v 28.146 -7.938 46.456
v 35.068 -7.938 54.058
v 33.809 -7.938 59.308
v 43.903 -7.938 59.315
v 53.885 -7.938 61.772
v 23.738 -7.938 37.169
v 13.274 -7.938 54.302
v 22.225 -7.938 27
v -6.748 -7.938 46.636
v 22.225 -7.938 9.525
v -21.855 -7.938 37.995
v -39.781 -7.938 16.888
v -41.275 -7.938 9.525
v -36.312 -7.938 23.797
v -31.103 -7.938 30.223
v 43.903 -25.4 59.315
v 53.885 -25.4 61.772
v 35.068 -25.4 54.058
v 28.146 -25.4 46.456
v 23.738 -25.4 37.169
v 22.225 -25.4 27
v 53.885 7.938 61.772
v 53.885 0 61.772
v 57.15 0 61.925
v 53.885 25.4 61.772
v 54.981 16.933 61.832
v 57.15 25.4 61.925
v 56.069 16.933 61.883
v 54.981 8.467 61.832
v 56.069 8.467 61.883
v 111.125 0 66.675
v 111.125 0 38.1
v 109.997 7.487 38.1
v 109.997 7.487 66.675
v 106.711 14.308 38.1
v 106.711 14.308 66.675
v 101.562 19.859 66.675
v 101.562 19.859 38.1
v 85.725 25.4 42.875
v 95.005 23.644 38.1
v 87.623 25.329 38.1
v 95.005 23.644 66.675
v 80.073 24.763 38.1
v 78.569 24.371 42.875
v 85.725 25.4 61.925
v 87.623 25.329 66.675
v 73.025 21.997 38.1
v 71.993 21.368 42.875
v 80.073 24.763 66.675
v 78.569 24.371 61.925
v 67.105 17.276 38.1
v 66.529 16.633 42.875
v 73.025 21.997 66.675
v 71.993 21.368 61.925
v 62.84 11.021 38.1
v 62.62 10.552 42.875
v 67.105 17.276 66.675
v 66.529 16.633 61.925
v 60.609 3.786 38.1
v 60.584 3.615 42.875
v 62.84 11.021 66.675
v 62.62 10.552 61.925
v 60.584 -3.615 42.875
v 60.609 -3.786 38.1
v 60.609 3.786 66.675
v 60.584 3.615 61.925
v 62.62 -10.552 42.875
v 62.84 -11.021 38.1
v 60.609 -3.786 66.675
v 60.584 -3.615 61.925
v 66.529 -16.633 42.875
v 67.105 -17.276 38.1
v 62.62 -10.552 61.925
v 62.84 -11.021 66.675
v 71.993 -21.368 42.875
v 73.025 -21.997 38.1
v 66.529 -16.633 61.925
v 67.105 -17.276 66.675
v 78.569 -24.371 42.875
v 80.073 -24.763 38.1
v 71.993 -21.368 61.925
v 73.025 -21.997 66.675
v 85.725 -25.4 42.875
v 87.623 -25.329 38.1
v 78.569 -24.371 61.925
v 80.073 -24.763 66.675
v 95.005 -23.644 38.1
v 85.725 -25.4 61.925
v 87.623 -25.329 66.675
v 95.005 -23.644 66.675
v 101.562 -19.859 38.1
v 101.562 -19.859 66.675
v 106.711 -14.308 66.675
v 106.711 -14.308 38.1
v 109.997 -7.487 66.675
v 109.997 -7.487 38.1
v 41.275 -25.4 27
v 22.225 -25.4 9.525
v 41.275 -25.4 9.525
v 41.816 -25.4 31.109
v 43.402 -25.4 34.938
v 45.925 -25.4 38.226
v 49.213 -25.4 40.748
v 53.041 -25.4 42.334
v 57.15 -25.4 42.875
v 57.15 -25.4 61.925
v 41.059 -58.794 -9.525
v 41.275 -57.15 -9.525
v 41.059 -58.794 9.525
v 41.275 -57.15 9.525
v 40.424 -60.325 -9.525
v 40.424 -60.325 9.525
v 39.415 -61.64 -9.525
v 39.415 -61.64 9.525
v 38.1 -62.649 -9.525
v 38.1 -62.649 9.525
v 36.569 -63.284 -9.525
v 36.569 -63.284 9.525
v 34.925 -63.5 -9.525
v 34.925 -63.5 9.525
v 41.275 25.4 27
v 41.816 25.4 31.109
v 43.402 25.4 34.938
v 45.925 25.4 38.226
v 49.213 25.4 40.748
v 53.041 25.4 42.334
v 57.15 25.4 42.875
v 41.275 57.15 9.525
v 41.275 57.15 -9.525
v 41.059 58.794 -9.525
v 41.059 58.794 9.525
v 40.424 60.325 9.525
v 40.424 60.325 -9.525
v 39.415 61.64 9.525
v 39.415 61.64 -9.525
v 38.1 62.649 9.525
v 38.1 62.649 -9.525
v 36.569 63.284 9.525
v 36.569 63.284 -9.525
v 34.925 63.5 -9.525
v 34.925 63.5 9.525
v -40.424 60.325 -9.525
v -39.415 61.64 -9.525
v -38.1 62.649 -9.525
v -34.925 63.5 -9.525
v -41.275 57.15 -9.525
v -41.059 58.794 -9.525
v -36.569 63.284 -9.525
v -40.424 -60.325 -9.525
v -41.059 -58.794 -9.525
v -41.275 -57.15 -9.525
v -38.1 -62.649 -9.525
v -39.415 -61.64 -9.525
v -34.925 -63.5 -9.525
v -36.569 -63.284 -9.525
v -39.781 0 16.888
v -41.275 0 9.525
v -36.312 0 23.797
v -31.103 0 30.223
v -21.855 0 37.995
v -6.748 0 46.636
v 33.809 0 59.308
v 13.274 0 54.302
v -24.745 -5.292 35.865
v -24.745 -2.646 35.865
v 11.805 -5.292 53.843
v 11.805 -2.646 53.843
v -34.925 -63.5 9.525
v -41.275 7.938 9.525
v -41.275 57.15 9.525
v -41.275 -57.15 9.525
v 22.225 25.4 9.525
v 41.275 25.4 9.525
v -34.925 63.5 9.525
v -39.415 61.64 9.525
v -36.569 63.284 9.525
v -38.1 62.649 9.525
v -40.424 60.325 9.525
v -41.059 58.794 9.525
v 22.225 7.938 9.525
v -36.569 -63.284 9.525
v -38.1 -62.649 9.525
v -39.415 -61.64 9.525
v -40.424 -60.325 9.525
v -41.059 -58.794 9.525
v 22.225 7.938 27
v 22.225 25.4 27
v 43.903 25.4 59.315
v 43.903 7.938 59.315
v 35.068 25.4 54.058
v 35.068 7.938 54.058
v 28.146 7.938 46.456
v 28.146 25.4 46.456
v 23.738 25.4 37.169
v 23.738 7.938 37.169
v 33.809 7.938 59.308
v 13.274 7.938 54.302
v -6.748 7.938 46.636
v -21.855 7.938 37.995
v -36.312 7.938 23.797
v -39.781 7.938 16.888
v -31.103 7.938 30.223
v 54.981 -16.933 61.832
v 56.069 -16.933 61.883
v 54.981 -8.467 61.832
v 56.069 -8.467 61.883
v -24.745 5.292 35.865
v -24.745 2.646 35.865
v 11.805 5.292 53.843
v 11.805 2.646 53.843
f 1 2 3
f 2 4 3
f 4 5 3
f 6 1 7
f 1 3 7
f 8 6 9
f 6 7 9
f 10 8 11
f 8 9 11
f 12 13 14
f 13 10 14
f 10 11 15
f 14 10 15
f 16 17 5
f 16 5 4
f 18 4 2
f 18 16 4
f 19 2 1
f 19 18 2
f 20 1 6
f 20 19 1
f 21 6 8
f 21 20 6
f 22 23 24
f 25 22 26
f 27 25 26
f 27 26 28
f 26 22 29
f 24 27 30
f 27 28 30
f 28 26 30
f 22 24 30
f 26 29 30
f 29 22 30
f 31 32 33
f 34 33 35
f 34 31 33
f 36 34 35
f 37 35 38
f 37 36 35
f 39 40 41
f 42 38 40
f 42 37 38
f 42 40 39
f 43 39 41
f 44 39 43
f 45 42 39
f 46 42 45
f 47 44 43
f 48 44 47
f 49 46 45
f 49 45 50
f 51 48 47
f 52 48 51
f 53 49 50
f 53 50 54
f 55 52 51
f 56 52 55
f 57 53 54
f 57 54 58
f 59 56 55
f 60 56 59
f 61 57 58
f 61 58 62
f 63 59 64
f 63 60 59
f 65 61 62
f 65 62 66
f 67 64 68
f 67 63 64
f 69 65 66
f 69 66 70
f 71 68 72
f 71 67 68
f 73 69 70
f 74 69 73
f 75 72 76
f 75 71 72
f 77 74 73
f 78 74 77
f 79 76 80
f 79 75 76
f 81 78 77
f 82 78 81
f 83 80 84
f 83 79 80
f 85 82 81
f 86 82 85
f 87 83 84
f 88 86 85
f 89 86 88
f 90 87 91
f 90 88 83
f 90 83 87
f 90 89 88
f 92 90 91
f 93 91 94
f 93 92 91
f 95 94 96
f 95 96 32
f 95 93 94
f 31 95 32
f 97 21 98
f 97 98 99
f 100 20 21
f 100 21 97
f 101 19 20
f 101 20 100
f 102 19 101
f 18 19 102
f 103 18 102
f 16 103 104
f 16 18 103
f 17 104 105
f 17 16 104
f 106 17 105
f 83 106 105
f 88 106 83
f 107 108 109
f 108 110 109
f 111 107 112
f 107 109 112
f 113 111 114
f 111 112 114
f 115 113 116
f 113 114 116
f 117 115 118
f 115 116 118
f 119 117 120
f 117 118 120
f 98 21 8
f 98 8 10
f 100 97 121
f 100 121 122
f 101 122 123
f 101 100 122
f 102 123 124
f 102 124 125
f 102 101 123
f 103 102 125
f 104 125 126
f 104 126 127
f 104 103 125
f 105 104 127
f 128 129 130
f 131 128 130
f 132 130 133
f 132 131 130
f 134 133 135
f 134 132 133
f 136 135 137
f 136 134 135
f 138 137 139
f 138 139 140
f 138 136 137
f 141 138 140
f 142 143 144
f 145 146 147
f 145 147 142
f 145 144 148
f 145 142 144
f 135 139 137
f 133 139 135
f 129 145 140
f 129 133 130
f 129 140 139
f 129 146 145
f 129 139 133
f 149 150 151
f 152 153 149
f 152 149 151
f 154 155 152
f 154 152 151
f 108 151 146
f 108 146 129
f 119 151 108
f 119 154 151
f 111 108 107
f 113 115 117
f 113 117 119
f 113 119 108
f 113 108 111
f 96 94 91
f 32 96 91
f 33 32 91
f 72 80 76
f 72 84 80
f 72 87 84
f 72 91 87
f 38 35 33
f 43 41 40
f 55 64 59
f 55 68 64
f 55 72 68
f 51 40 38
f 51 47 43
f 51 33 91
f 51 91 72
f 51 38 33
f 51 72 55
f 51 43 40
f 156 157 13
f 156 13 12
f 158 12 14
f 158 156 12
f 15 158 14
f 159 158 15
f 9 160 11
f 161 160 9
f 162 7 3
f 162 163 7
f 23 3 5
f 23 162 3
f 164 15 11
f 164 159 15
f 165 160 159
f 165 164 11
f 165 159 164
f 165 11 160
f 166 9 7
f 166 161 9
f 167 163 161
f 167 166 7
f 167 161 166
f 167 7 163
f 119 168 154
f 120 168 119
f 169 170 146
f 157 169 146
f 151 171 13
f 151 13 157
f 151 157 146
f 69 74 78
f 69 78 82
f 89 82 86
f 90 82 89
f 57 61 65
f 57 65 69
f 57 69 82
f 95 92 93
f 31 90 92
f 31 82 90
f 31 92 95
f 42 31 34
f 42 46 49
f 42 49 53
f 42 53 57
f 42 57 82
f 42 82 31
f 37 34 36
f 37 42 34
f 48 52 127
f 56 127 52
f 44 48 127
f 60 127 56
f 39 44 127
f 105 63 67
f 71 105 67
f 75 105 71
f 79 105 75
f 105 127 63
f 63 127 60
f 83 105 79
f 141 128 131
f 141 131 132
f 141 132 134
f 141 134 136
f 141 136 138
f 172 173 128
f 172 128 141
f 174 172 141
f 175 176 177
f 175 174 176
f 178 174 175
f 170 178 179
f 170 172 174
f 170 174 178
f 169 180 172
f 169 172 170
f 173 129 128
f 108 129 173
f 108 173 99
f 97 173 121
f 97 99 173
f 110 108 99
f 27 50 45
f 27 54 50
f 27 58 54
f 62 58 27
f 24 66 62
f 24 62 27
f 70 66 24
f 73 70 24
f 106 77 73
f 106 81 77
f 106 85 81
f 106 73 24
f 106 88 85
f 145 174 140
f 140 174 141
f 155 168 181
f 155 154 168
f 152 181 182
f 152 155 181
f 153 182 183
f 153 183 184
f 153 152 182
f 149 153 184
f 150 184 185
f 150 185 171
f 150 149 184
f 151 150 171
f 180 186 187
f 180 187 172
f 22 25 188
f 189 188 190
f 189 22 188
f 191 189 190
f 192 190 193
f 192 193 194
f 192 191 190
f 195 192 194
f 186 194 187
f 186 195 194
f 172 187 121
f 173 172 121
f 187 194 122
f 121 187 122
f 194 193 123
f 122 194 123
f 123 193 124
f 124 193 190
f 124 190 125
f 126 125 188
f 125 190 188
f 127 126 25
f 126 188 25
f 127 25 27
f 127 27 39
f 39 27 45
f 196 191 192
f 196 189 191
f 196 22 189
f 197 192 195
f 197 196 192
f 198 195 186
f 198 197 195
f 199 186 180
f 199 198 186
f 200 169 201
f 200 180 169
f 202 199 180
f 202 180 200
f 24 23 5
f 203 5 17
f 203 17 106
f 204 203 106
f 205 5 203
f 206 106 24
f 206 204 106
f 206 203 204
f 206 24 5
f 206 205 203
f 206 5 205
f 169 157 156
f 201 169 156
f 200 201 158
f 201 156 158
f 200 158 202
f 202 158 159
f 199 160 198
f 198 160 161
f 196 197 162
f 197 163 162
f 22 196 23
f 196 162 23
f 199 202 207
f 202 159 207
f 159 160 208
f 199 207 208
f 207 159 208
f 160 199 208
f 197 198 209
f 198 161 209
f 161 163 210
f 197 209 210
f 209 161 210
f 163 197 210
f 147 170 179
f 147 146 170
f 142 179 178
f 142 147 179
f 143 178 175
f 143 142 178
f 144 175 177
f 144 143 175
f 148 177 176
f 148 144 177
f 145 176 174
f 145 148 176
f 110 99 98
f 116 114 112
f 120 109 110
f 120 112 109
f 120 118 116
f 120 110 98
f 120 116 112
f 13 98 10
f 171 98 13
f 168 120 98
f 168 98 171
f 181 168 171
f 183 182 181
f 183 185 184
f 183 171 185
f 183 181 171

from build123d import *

# Parameters (mm, degrees)
F1_DEPTH = 63.5
F0_W     = 25.4
F0_H     = 19.05
F2_DEPTH = 25.4
F3_DEPTH = 7.9375
F5_R     = 6.35


# Not quite as in the source:
# - a feature of the source that left no trace in its solid (it failed there, or was rolled back) is left out


with BuildPart() as f1:
    # F0 (on Front) → F1 (new body, symmetric)
    with BuildSketch(Plane.XZ):
        Polygon((22.225, 9.525), (-41.275, 9.525), (-41.275, -9.525), (41.275, -9.525), (41.275, 9.525), align=None)
    extrude(amount=F1_DEPTH, both=True)

    # F0 (on Front) → F2 (join, symmetric)
    with BuildSketch(Plane.XZ):
        with BuildLine():
            Line((22.225, 27.0002), (22.225, 9.525))
            Line((22.225, 9.525), (41.275, 9.525))
            Line((41.275, 9.525), (41.275, 27.0002))
            ThreePointArc((41.275, 27.0002), (45.9246798487, 38.2255201513), (57.15, 42.8752))
            Line((57.15, 42.8752), (60.325, 42.8752))
            Line((60.325, 42.8752), (60.325, 61.9252))
            Line((60.325, 61.9252), (57.15, 61.9252))
            add(Edge.make_bspline(
                [(53.8854342407, 61.7722898912), (54.9842067368, 61.8365871986), (56.0728453275, 61.8876096574), (57.15, 61.9252)],
                knots=[108.5245810491, 108.5245810491, 108.5245810491, 108.5245810491, 111.5045361635, 111.5045361635, 111.5045361635, 111.5045361635], degree=3))
            ThreePointArc((53.8854342407, 61.7722898912), (31.3258777096, 50.5133948686), (22.225, 27.0002))
        make_face()
        with Locations((73.025, 52.4002)):
            Rectangle(F0_W, F0_H)
    extrude(amount=F2_DEPTH, both=True)

    # F0 (on Front) → F3 (join, symmetric)
    with BuildSketch(Plane.XZ):
        with BuildLine():
            add(Edge.make_bspline(
                [(-41.275, 9.525), (-39.5856284224, 39.4828766469), (13.870125209, 59.4306981306), (53.8854342407, 61.7722898912)],
                knots=[0, 0, 0, 0, 108.5245810491, 108.5245810491, 108.5245810491, 108.5245810491], degree=3))
            Line((-41.275, 9.525), (22.225, 9.525))
            Line((22.225, 9.525), (22.225, 27.0002))
            ThreePointArc((22.225, 27.0002), (31.3258777096, 50.5133948686), (53.8854342407, 61.7722898912))
        make_face()
    extrude(amount=F3_DEPTH, both=True)

    # F0 (on Front) → F4 (revolve)
    with BuildSketch(Plane.XZ):
        Polygon((85.725, 66.675), (85.725, 61.9252), (85.725, 42.8752), (85.725, 38.1), (111.125, 38.1), (111.125, 66.675), align=None)
    revolve(axis=Axis((85.725, 0, 52.3875), (0, 0, 1)))

    # F5
    f5_edges = [f1.edges().sort_by_distance(p)[0] for p in [
        (-41.275, -63.5, 0),
        (41.275, -63.5, 0),
        (-41.275, 63.5, 0),
        (41.275, 63.5, 0),
    ]]
    fillet(f5_edges, radius=F5_R)


solid = f1.part
